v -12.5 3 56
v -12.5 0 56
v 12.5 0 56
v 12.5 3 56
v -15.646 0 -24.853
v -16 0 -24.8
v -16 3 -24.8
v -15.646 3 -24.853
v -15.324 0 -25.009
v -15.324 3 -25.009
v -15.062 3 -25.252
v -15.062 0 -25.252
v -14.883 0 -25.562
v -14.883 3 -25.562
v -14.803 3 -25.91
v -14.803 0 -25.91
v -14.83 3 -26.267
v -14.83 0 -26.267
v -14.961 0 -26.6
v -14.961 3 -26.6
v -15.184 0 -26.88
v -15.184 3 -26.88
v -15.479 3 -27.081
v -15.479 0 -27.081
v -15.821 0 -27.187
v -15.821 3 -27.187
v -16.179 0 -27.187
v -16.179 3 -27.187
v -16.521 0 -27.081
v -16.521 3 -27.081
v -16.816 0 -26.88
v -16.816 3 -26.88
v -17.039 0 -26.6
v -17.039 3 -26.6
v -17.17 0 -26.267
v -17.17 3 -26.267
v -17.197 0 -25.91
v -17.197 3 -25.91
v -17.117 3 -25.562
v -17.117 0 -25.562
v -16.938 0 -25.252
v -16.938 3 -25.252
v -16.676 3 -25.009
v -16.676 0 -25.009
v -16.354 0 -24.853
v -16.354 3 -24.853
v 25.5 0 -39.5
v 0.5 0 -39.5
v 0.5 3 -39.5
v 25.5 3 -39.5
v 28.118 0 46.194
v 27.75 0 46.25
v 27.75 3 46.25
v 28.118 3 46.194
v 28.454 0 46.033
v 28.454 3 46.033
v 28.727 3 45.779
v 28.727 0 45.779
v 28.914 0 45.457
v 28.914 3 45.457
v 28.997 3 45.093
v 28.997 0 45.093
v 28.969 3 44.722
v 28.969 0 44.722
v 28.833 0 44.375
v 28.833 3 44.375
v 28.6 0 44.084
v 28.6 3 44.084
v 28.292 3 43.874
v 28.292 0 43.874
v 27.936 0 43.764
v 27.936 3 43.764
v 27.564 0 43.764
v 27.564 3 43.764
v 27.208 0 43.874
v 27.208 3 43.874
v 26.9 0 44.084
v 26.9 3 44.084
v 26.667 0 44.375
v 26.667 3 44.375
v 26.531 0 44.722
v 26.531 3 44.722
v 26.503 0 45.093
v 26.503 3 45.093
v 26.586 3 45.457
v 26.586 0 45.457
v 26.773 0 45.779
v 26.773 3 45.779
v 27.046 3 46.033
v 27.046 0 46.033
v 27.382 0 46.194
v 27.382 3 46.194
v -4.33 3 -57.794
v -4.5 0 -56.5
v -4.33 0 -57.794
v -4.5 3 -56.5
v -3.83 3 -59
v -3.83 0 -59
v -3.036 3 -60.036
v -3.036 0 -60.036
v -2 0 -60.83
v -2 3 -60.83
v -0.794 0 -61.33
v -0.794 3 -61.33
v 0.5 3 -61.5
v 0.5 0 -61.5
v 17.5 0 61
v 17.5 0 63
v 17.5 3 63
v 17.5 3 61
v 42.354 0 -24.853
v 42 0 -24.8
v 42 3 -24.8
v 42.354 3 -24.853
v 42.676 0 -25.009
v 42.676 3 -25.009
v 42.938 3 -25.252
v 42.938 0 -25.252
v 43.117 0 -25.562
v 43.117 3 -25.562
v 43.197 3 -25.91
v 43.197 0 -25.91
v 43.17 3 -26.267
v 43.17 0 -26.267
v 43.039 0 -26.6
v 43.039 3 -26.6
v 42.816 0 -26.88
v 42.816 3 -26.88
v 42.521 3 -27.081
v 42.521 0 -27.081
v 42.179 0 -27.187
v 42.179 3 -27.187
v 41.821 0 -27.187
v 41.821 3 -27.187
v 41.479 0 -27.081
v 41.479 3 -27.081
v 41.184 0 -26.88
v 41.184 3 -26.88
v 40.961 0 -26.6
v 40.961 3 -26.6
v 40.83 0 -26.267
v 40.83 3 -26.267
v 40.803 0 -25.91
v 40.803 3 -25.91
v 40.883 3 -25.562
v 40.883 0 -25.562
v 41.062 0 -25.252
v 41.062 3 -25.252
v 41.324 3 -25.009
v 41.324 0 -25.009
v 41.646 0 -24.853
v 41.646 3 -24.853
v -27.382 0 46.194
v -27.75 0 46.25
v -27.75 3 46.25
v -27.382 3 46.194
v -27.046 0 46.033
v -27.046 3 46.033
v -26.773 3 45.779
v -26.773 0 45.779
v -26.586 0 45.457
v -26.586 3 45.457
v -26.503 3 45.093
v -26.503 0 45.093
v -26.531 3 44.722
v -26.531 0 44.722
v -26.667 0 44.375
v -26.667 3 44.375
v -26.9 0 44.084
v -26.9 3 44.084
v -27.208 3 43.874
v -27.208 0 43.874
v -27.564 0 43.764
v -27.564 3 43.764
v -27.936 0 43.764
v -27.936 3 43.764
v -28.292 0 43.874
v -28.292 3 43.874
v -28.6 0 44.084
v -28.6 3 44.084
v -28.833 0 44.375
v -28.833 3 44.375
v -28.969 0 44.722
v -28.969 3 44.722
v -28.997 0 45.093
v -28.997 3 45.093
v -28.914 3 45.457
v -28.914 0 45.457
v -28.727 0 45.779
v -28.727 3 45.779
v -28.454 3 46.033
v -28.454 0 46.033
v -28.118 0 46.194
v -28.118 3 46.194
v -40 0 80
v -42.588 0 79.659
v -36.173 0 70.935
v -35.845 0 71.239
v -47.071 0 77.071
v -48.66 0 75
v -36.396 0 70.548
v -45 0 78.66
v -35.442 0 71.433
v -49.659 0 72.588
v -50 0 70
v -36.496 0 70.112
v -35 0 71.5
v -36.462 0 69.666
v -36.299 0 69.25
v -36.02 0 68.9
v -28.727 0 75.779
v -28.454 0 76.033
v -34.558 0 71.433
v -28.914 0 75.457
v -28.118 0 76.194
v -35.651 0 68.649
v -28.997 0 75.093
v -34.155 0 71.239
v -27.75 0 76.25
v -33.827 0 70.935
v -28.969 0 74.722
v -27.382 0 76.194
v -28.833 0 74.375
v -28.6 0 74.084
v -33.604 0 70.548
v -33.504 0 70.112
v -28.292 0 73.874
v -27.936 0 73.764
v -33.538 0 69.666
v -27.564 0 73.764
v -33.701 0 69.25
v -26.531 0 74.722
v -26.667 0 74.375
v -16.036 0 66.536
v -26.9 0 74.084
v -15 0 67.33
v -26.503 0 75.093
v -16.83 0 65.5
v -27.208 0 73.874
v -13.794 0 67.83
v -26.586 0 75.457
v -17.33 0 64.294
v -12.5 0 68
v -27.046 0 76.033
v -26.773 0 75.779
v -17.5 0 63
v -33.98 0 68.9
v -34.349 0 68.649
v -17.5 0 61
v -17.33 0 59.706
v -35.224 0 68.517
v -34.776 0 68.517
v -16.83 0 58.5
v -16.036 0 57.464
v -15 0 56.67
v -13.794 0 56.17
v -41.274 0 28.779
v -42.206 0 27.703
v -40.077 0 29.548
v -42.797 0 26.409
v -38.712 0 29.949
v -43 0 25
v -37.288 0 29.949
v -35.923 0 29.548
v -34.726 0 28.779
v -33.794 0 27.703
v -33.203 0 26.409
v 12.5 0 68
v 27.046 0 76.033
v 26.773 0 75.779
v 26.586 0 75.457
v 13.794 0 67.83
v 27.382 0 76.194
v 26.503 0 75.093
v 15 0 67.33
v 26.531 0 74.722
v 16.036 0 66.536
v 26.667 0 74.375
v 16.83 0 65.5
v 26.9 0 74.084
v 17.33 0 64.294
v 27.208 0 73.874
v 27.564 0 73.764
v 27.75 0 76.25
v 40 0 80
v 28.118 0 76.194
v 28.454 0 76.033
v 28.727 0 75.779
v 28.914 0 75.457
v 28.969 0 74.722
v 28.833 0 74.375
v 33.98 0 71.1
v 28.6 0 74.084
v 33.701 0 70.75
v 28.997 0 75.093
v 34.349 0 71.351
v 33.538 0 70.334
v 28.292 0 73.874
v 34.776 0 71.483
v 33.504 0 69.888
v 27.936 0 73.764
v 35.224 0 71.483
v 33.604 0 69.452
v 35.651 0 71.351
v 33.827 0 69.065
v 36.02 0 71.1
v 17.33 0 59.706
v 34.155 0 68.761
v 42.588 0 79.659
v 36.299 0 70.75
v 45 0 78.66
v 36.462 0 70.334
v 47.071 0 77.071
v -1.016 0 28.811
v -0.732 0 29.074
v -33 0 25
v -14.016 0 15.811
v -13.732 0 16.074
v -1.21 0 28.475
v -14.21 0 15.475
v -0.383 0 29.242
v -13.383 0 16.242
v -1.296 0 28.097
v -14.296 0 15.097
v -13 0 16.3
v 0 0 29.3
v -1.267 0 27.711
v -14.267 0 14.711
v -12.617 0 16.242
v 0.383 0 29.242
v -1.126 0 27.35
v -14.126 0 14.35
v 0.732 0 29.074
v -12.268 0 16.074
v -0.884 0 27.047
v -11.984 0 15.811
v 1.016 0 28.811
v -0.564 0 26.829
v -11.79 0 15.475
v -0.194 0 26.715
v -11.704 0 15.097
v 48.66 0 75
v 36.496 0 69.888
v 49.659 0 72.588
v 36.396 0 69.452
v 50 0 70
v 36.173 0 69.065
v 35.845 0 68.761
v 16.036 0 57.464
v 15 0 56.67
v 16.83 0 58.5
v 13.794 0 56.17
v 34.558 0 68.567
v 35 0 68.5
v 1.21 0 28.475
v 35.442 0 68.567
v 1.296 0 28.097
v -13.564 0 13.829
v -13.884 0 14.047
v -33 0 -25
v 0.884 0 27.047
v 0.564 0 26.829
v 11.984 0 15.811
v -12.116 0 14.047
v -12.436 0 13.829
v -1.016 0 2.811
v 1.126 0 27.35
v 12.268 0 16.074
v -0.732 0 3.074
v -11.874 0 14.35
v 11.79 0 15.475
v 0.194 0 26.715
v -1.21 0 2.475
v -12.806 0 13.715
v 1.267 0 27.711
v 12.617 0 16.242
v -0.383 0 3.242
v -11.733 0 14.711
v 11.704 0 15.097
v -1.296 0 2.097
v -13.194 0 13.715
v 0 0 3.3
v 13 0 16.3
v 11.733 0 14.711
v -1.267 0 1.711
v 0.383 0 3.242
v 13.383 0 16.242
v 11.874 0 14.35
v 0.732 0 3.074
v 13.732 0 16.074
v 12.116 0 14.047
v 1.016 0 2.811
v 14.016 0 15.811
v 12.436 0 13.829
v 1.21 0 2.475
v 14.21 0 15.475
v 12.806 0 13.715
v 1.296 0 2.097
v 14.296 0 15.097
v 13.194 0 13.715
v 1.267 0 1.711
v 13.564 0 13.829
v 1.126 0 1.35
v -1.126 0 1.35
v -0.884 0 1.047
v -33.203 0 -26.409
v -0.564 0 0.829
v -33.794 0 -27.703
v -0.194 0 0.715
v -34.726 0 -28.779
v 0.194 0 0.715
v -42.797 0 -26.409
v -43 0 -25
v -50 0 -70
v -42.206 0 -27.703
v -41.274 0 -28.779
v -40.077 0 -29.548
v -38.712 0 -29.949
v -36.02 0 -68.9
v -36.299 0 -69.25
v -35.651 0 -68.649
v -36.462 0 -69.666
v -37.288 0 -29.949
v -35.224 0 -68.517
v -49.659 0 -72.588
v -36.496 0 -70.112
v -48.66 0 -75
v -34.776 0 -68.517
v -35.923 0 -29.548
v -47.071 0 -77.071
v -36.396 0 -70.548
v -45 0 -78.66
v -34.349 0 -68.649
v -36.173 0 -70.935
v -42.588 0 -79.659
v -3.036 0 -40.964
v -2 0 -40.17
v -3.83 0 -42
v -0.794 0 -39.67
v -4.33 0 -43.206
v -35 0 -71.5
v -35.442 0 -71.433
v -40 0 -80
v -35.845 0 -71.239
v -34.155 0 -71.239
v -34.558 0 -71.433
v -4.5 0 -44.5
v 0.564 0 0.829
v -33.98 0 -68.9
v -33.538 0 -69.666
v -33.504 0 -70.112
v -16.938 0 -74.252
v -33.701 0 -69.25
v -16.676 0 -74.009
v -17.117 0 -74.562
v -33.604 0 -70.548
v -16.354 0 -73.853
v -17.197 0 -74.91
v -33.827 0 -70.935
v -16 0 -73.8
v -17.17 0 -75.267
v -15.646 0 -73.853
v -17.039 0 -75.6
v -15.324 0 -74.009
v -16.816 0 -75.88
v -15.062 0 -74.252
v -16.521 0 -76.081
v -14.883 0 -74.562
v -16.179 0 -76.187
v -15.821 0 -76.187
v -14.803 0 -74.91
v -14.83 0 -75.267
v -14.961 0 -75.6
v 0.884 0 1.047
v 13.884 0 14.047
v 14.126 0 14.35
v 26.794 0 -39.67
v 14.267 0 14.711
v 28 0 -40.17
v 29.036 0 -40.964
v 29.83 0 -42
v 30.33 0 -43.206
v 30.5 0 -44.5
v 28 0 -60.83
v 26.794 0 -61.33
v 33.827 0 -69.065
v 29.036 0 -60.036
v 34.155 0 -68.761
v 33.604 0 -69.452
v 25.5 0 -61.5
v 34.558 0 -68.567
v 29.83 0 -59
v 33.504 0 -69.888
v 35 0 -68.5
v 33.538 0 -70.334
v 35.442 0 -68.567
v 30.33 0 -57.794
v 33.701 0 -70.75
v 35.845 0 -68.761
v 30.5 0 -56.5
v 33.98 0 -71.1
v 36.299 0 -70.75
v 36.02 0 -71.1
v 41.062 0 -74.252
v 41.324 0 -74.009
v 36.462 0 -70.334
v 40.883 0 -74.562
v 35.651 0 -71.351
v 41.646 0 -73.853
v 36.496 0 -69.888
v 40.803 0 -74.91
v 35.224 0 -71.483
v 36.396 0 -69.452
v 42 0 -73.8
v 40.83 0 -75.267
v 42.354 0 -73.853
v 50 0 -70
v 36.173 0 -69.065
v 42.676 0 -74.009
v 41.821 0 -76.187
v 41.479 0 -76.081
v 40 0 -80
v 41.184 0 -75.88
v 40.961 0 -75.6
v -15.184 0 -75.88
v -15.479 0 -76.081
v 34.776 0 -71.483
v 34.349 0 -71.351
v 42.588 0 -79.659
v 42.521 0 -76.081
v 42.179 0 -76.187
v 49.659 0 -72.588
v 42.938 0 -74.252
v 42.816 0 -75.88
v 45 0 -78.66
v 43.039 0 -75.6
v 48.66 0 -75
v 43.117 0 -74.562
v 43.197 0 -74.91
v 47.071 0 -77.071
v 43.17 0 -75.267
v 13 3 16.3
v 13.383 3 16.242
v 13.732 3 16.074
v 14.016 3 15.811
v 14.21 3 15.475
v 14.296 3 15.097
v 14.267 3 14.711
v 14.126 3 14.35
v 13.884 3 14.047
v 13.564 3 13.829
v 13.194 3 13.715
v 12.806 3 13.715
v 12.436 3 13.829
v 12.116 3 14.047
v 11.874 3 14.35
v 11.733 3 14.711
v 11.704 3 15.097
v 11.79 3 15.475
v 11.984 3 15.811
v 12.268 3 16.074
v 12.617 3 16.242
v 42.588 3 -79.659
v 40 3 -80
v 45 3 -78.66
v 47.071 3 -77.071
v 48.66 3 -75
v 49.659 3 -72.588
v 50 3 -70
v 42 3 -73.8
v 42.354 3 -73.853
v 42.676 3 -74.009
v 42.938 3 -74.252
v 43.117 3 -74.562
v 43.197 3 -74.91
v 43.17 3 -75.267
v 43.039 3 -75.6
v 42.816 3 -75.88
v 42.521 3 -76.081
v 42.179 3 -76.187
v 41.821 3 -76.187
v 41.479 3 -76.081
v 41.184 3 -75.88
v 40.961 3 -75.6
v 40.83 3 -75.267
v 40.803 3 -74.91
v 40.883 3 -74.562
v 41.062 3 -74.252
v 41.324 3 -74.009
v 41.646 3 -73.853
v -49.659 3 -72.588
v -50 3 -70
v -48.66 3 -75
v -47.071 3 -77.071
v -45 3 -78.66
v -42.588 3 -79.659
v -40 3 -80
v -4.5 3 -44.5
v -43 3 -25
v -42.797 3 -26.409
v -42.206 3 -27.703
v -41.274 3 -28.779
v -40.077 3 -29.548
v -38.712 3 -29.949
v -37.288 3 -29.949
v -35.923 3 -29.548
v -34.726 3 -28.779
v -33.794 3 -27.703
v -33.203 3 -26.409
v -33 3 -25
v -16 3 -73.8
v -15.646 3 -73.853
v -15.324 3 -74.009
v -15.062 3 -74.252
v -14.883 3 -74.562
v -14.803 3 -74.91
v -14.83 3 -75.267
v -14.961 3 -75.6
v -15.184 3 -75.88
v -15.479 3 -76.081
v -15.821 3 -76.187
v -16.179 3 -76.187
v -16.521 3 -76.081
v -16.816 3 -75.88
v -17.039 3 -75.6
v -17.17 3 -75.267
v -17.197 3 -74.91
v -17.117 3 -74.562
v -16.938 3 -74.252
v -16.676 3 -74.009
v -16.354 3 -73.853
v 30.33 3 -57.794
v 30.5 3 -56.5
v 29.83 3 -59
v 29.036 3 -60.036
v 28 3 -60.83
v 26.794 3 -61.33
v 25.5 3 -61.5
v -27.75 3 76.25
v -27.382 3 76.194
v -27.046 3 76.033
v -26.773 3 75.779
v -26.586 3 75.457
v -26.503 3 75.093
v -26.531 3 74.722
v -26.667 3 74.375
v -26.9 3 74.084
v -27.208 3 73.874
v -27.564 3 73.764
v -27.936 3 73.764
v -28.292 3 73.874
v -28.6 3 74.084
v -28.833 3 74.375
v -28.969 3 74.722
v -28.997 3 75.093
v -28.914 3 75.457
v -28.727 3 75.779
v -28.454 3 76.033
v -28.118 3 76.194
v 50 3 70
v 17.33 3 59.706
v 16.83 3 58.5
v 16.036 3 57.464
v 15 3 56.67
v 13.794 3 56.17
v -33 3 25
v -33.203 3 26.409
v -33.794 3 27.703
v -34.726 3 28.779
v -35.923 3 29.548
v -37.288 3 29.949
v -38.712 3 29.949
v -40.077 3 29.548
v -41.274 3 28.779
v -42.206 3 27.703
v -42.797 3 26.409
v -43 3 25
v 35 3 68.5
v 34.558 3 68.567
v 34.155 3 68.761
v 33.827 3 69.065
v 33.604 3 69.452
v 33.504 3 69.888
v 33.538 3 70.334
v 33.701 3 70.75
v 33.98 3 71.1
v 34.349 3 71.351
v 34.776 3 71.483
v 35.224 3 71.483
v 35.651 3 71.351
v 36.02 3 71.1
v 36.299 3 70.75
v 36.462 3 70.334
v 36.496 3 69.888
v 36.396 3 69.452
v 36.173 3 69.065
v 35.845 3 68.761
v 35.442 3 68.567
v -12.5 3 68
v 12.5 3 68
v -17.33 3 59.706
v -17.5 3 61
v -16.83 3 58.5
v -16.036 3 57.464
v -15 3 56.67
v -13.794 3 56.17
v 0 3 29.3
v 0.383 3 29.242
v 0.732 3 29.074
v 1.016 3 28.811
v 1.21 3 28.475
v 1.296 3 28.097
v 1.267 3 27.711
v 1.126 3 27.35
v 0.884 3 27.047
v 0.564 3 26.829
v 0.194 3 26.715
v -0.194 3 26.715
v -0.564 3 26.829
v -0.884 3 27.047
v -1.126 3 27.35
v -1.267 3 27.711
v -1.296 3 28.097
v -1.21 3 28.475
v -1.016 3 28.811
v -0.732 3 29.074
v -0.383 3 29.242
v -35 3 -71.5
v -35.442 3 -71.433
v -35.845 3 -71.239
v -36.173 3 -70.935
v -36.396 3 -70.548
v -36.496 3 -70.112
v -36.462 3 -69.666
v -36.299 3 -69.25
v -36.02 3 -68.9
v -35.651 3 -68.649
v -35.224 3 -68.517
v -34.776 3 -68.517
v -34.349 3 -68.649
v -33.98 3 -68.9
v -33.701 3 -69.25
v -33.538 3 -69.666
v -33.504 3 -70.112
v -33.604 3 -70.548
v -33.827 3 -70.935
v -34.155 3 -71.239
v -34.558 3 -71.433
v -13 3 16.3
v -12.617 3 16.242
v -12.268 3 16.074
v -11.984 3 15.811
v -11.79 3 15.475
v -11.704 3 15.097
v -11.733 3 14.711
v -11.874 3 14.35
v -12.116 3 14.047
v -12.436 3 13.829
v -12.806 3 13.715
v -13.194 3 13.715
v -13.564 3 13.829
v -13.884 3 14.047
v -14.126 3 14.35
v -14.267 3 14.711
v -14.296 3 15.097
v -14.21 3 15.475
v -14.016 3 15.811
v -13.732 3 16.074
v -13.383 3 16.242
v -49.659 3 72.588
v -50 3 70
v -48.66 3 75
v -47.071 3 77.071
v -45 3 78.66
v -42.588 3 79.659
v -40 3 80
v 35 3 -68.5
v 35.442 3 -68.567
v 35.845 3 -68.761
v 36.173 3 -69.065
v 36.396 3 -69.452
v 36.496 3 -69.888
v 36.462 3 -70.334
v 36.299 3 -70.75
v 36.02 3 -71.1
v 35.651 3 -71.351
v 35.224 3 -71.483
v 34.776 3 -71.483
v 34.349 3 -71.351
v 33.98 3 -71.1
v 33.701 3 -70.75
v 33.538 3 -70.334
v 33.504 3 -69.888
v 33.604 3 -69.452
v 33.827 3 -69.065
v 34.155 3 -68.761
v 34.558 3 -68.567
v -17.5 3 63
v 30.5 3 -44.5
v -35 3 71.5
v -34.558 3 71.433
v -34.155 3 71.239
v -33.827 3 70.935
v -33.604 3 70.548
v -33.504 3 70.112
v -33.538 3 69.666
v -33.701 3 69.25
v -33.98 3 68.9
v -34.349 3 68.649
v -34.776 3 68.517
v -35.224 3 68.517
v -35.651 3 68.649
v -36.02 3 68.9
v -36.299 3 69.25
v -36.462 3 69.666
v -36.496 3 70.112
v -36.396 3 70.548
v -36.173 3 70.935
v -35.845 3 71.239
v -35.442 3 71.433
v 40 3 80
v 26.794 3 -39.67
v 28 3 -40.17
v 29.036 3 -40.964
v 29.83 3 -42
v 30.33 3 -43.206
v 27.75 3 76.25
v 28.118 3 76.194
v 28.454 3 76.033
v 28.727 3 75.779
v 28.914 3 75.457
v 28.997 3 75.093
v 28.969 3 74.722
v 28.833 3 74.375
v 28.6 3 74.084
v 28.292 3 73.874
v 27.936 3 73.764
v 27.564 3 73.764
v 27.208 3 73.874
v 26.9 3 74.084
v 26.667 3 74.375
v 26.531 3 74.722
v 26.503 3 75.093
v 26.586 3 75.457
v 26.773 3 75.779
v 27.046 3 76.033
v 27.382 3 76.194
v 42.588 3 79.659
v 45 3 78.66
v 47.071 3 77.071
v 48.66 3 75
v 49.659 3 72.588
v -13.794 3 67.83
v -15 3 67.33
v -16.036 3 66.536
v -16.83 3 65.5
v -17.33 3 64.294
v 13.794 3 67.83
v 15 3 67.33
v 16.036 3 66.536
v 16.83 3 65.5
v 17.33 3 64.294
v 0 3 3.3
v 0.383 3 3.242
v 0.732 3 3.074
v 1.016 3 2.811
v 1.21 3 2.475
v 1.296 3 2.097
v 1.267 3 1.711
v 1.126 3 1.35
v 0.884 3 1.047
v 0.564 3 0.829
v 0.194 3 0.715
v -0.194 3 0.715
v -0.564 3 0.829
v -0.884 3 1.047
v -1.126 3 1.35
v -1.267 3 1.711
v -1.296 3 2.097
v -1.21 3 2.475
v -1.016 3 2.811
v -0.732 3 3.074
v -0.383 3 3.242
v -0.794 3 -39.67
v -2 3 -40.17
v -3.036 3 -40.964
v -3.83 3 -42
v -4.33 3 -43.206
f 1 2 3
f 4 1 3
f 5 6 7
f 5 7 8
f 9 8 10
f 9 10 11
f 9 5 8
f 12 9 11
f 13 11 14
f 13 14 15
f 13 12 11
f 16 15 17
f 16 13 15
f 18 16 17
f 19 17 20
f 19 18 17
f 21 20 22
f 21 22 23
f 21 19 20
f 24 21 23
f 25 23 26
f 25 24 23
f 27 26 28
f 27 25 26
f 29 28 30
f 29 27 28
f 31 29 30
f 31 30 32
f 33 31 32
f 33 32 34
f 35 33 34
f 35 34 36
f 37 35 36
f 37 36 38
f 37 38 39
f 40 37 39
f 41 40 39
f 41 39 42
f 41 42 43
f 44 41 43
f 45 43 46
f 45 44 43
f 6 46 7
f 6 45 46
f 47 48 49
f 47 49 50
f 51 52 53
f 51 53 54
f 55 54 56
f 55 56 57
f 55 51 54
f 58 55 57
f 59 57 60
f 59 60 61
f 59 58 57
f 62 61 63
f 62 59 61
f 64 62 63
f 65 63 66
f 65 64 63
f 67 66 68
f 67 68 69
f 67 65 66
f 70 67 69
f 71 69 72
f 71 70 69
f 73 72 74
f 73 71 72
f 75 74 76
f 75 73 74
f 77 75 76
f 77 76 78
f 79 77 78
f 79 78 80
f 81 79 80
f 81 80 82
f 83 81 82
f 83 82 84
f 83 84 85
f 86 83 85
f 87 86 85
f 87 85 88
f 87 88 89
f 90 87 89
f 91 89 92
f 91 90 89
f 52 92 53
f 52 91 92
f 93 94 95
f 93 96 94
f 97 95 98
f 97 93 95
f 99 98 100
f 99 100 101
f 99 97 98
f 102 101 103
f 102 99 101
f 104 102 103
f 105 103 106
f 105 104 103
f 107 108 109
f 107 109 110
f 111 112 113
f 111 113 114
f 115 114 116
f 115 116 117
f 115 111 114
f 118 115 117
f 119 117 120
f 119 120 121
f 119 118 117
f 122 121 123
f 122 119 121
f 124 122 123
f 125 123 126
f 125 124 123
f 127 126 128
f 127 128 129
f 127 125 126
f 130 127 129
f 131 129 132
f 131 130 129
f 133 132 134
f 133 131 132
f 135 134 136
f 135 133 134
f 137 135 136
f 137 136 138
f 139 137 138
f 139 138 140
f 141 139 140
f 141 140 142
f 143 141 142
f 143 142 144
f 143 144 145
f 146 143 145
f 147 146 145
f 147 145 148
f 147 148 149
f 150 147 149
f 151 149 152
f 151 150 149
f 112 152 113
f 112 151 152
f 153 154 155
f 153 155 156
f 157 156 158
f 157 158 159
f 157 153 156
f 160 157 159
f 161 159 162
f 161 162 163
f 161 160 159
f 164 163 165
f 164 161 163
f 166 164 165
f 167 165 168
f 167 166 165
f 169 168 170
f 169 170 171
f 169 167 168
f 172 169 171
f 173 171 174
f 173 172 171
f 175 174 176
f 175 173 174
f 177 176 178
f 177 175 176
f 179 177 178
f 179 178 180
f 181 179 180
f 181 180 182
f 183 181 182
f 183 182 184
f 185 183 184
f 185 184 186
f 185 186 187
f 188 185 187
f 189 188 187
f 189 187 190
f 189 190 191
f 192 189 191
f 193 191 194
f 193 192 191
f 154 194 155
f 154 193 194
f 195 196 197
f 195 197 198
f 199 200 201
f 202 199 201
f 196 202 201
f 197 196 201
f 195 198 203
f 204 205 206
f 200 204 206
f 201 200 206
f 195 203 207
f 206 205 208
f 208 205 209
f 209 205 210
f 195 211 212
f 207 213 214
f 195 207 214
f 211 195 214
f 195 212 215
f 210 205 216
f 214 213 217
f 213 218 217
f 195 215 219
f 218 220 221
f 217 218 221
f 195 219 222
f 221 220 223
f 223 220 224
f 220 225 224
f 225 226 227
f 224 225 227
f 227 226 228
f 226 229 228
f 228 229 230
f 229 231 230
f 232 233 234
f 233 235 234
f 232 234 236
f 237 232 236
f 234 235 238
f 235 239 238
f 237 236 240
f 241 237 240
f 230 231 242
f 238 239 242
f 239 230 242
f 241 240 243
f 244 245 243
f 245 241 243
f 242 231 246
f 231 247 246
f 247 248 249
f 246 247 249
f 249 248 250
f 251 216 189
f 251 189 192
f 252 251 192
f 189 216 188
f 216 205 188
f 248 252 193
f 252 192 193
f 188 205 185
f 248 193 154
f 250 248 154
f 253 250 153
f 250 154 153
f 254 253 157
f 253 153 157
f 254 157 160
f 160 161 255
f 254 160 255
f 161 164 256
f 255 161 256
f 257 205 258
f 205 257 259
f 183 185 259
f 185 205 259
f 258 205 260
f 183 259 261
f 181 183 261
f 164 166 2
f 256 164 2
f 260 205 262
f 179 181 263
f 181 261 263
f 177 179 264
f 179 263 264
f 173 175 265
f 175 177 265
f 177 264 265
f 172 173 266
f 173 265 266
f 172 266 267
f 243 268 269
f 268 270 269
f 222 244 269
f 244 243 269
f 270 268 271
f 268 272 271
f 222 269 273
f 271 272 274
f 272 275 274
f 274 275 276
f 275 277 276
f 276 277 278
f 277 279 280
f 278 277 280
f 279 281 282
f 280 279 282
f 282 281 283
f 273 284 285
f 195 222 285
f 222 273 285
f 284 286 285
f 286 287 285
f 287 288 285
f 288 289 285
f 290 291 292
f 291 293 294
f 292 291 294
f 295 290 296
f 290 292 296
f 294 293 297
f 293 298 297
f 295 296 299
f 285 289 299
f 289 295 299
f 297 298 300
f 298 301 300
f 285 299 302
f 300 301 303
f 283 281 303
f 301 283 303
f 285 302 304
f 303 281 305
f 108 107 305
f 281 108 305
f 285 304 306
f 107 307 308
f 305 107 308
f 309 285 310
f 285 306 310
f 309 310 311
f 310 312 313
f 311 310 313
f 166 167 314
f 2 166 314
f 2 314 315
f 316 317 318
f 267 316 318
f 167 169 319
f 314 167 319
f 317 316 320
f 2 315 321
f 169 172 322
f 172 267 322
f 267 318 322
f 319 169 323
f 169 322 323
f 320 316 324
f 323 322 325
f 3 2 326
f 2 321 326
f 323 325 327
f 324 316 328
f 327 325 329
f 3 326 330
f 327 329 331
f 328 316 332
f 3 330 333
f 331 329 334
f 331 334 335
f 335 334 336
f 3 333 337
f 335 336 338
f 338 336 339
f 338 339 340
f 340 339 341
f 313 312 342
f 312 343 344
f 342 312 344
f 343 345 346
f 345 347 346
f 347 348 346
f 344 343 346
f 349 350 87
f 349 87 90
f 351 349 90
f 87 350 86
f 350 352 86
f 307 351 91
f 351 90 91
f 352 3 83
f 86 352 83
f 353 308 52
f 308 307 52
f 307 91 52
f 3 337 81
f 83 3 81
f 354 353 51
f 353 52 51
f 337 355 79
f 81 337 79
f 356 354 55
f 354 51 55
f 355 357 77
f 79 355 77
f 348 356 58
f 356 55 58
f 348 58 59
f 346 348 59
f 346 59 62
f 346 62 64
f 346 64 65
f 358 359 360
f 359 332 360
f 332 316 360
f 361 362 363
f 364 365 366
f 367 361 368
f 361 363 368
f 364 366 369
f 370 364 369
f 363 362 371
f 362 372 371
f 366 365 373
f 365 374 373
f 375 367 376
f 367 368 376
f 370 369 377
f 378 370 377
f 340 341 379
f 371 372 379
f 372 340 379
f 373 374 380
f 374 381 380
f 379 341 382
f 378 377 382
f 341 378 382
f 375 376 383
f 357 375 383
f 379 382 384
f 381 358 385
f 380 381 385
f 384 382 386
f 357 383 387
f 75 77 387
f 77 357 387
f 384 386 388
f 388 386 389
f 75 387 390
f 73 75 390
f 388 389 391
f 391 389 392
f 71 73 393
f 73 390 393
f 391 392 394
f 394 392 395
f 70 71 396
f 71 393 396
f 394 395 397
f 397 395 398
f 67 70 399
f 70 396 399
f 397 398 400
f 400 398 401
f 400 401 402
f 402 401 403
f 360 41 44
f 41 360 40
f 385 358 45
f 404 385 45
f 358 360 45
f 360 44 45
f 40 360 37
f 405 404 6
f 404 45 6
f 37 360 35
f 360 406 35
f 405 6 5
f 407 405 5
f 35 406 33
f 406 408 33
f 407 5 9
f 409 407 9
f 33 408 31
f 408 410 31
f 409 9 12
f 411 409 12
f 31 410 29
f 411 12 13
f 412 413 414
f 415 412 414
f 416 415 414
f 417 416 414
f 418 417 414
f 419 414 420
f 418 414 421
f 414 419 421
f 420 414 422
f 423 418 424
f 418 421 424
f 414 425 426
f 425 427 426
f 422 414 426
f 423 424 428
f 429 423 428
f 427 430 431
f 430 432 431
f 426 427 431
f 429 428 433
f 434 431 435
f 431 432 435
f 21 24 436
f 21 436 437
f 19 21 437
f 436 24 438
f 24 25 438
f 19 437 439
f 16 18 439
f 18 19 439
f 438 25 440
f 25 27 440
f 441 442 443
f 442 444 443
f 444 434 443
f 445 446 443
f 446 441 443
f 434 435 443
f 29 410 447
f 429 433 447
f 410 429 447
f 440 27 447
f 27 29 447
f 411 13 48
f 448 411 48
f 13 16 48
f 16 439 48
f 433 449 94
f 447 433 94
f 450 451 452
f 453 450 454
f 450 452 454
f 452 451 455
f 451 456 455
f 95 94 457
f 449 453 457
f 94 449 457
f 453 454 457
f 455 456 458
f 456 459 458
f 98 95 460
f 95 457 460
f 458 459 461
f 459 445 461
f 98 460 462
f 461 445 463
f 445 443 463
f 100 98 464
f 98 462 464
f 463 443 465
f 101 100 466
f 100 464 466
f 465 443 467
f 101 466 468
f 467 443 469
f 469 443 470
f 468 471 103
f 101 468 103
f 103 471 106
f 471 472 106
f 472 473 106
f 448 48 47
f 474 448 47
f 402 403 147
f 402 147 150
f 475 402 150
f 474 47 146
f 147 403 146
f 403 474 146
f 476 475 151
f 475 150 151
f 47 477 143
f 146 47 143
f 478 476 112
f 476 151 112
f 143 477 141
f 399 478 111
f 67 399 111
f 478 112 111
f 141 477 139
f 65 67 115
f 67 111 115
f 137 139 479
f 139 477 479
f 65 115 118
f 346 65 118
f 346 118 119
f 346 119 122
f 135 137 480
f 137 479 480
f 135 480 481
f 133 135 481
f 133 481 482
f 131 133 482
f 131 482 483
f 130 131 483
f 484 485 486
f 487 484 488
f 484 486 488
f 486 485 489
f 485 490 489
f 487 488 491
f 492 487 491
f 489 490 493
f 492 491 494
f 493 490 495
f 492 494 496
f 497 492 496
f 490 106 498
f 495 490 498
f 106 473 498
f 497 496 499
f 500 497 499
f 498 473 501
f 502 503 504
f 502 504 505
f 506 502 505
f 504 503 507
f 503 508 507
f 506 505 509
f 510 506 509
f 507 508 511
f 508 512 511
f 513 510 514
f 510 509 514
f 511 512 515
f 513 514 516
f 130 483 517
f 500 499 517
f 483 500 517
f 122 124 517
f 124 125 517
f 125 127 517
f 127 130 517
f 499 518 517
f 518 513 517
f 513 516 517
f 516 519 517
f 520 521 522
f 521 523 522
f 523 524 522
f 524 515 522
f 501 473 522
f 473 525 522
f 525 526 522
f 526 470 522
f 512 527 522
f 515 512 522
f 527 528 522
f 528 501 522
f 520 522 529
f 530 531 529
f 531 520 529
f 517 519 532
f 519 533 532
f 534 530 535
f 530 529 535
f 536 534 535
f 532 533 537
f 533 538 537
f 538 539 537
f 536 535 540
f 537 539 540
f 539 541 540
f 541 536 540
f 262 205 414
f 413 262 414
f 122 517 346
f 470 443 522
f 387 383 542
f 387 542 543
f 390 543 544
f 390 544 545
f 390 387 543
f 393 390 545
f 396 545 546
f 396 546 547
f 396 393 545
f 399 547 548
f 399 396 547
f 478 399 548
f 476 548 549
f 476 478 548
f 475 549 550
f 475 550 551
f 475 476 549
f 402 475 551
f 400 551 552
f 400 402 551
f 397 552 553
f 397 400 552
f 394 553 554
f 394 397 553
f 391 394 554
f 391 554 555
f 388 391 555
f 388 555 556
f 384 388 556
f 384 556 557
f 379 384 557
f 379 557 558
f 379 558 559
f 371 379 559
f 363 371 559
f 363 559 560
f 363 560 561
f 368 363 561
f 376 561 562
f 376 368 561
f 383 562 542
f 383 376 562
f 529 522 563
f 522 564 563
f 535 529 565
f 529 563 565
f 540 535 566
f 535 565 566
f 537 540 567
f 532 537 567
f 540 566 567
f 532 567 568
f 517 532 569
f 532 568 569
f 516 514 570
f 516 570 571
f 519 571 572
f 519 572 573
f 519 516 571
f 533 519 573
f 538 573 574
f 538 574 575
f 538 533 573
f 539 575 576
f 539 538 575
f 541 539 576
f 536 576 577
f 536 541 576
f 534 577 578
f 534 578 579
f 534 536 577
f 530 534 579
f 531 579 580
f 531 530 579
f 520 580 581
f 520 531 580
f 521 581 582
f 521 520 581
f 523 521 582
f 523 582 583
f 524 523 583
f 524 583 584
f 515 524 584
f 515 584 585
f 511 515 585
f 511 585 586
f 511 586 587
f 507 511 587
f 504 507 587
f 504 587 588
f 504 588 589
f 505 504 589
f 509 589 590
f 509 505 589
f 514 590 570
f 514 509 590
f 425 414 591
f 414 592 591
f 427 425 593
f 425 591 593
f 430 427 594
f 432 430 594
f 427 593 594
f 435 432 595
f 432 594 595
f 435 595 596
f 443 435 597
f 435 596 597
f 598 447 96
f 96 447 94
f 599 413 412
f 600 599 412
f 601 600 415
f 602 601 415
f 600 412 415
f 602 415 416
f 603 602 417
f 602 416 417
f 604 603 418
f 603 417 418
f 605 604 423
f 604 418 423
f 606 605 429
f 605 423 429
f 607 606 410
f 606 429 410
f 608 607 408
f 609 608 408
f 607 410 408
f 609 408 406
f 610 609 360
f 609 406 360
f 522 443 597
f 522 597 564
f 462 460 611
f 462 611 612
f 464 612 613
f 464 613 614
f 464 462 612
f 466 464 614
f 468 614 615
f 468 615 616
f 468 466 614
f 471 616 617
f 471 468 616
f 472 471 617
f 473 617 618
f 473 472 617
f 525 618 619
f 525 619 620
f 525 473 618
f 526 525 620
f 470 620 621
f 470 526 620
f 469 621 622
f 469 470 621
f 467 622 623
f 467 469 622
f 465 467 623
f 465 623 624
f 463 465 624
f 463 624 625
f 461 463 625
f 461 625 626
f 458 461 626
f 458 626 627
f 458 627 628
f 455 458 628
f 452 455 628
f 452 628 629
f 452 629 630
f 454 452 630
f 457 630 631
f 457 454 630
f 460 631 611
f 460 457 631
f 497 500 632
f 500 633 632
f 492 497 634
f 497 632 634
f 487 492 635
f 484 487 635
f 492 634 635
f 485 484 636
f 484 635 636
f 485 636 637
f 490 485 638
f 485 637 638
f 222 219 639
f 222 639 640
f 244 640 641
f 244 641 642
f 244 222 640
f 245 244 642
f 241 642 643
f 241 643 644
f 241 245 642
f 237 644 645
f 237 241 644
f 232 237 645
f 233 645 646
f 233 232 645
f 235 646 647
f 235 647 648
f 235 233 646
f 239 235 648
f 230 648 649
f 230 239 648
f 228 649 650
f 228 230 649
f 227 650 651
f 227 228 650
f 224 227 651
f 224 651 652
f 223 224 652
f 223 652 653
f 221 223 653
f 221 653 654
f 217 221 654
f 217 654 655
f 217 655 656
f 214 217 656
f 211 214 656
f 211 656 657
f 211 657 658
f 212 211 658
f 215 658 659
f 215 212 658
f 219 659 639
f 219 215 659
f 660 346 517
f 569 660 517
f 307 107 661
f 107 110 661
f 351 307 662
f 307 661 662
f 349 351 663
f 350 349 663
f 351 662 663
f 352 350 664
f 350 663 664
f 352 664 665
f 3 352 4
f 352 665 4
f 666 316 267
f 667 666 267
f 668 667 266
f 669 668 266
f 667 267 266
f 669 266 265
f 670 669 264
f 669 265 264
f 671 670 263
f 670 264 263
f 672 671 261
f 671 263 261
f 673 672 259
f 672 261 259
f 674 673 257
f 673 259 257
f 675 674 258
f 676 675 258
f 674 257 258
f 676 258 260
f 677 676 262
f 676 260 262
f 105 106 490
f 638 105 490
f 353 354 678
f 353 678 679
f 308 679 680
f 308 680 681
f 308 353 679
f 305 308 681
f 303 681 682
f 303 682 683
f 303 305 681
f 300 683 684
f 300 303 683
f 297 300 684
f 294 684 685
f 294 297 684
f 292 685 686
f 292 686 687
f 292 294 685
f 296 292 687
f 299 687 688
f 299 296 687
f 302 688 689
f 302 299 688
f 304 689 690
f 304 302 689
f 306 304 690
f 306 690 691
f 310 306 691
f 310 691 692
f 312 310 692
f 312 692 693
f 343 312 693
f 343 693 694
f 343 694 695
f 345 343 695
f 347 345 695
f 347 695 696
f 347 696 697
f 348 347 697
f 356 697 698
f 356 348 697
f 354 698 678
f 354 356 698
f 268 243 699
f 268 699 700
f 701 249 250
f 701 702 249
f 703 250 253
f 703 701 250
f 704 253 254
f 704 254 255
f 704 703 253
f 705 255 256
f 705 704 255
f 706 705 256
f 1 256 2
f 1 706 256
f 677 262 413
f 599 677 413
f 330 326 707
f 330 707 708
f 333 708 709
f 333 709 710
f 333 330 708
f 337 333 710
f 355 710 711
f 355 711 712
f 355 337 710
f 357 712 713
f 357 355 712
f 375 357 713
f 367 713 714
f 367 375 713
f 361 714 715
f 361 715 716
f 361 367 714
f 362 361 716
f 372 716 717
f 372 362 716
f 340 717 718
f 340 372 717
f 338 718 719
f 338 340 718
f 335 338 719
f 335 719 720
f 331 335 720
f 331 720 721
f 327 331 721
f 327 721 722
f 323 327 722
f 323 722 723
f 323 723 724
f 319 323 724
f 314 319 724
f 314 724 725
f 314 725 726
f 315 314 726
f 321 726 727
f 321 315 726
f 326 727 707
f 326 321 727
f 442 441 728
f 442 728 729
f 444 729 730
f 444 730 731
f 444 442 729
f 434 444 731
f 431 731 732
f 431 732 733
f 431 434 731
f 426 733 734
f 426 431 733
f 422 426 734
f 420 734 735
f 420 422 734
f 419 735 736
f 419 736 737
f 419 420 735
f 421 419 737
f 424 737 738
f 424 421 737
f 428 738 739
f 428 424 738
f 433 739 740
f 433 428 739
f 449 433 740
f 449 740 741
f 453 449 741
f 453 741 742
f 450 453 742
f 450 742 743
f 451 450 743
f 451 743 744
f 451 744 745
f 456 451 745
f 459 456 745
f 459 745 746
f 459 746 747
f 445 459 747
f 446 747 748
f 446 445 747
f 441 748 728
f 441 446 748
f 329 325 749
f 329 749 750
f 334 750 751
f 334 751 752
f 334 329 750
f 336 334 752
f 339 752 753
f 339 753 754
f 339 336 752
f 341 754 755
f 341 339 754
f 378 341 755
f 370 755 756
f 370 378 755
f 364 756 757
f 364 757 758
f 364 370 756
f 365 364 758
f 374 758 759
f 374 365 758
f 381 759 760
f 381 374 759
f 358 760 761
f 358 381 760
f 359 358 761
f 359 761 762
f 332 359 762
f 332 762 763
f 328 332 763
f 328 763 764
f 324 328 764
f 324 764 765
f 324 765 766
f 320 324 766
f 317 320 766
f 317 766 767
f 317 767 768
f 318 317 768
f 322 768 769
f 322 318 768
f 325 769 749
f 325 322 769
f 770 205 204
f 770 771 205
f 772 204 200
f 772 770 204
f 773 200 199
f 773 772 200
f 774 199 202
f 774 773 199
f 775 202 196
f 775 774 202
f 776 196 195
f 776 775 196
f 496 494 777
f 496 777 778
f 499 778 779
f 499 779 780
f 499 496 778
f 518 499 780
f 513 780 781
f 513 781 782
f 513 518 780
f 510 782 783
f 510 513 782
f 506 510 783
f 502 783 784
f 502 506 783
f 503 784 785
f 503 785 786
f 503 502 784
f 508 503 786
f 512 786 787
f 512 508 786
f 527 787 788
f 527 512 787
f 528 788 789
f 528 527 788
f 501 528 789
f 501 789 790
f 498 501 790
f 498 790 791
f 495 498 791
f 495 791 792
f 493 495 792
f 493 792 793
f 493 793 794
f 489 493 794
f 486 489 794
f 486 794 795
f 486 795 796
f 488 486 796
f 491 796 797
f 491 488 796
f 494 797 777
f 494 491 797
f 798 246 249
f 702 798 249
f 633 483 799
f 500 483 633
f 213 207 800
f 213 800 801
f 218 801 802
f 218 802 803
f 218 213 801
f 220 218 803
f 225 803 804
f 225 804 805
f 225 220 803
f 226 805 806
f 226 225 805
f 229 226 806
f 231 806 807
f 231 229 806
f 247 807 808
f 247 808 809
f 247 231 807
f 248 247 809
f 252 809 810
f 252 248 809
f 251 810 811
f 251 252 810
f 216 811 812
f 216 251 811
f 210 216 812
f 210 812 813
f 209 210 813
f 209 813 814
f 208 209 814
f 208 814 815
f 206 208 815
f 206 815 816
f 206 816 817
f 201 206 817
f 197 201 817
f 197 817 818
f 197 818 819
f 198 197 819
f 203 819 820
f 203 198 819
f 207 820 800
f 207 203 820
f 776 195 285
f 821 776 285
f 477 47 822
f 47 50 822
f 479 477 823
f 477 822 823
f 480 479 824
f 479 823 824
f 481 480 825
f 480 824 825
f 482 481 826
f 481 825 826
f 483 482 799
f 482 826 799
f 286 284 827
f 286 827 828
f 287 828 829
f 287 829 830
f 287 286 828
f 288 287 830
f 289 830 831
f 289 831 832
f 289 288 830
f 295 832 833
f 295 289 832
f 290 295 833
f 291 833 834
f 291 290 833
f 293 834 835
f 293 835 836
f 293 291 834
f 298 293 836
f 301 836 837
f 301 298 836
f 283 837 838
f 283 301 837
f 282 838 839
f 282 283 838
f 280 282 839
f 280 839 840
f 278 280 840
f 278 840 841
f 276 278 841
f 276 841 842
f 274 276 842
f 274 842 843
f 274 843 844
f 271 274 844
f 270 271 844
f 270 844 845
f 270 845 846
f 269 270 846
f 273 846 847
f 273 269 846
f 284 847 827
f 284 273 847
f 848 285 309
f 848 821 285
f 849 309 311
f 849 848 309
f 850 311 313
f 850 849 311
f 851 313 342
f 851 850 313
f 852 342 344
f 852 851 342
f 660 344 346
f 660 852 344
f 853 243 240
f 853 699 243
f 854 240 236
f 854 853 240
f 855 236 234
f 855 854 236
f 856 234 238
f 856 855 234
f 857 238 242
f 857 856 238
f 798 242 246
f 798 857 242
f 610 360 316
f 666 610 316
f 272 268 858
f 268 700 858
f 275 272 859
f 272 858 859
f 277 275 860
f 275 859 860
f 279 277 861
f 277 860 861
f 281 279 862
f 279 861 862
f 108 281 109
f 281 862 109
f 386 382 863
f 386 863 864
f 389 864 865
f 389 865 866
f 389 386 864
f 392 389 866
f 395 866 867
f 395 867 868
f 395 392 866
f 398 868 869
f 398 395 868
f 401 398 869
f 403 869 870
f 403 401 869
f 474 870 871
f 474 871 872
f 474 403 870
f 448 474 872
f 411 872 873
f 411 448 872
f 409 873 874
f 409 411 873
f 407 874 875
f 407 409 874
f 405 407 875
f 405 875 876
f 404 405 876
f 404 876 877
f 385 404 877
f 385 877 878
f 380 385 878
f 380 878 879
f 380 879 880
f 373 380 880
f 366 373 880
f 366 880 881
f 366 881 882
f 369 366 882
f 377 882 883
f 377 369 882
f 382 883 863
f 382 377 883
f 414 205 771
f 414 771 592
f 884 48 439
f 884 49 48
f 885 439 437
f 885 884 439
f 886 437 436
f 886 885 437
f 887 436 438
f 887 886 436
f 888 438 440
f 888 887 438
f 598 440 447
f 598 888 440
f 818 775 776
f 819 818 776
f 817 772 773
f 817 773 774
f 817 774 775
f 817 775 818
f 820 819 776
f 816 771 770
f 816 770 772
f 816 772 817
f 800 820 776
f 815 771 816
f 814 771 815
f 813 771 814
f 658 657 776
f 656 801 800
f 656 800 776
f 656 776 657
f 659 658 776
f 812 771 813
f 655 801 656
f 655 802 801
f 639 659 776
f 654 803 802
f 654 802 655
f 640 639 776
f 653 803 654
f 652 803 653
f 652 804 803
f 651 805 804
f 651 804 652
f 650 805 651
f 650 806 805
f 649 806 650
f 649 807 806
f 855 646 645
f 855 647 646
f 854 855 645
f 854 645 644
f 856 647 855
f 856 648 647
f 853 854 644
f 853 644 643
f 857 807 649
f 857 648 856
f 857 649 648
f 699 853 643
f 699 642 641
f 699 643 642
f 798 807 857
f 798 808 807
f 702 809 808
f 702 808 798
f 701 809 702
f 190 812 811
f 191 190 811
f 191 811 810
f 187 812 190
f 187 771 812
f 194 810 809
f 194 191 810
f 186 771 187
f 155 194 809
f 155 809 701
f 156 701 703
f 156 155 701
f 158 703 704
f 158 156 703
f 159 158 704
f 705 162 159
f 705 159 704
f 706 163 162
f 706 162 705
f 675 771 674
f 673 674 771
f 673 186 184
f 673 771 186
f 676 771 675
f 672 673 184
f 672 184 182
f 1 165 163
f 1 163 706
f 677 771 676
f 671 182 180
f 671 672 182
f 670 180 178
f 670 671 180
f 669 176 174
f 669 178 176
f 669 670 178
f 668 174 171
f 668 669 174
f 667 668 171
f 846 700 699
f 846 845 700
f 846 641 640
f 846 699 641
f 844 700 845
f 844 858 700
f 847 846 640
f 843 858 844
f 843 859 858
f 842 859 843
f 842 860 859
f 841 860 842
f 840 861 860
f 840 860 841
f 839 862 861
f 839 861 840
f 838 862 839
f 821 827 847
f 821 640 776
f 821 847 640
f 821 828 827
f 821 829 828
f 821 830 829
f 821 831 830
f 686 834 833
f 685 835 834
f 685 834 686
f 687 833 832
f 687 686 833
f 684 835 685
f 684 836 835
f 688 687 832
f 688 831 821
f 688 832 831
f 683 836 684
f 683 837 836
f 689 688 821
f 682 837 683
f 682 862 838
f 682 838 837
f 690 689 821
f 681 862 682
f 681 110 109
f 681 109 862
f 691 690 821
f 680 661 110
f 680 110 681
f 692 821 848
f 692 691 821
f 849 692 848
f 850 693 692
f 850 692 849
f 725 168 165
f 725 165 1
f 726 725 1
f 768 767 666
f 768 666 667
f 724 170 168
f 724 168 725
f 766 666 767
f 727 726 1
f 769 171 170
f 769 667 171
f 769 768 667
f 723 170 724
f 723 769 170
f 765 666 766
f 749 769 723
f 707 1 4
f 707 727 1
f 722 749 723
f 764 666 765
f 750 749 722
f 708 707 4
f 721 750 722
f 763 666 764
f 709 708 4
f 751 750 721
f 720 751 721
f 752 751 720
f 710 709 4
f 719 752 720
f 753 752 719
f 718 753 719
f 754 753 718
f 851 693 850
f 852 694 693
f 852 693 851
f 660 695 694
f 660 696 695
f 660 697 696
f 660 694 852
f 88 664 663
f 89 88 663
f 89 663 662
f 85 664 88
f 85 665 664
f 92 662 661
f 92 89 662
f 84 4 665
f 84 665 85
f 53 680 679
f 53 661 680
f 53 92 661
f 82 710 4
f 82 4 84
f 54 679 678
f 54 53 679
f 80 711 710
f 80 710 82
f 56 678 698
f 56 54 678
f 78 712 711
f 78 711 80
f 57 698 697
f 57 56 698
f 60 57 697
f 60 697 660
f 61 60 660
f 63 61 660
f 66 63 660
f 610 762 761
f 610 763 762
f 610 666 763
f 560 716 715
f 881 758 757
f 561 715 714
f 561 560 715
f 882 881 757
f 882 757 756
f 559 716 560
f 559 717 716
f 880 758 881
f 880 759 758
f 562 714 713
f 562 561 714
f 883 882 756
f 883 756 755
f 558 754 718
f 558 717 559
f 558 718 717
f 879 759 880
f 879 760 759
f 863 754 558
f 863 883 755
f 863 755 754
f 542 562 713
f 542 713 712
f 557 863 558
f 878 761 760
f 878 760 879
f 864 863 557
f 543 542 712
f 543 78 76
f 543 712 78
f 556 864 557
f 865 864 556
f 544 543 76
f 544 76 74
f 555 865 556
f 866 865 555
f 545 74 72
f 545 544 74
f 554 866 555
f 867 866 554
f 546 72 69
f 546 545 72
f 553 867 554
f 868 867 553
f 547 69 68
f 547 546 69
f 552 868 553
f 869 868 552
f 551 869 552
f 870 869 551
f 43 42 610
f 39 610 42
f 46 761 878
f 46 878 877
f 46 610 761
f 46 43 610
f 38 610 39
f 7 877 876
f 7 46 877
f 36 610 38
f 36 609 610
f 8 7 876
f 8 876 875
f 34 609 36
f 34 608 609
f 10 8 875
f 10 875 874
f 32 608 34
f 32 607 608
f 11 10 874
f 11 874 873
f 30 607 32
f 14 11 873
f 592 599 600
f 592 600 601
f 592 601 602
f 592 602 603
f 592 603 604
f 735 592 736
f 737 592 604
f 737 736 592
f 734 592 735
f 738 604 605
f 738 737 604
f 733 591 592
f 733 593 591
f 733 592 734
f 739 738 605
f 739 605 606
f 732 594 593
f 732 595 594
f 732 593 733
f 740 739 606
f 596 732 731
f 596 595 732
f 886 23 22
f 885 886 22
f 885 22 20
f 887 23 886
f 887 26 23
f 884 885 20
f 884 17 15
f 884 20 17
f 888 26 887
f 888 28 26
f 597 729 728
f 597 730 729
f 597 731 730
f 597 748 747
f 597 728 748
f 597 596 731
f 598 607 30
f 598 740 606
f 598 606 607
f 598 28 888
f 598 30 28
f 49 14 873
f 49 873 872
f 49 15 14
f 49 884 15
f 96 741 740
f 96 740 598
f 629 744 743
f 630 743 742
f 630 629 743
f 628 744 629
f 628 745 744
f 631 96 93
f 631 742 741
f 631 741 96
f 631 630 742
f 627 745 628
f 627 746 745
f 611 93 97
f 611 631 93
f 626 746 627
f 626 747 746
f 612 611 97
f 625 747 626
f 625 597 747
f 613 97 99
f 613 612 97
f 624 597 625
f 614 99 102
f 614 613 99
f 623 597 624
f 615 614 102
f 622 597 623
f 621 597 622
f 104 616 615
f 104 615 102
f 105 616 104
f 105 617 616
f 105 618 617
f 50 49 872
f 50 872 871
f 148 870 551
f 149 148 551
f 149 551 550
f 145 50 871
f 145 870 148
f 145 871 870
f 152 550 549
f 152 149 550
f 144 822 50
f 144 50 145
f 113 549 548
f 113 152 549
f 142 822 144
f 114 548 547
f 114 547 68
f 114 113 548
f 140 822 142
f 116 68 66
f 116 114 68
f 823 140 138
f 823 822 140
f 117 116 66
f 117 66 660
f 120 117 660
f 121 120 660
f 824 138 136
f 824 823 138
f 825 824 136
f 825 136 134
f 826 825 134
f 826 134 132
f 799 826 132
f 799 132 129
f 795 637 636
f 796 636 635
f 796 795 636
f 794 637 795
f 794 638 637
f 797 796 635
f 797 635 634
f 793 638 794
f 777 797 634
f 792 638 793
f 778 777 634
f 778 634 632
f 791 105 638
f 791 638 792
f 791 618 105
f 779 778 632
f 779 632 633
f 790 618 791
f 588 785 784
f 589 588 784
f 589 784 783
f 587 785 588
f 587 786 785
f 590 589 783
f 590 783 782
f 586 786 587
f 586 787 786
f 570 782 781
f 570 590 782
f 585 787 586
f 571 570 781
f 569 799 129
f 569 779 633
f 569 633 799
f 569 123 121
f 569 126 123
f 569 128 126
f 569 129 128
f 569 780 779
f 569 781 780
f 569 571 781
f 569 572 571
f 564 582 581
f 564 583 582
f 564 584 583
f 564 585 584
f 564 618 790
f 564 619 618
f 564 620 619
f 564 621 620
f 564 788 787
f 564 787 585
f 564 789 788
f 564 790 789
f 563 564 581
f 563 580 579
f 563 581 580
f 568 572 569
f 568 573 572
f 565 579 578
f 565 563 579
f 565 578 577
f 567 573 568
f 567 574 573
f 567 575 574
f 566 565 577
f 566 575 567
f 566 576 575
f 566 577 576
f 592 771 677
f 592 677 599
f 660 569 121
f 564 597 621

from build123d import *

# Parameters (mm, degrees)
SKETCH_1_W      = 100
SKETCH_1_H      = 160
SKETCH_1_R      = 1.5
SKETCH_1_R_2    = 1.3
SKETCH_1_R_3    = 1.2
SKETCH_1_R_4    = 1.25
SKETCH_1_W_2    = 35
SKETCH_1_H_2    = 12
SKETCH_1_H_3    = 22
EXTRUDE_1_DEPTH = 3
FILLET_1_R      = 10
FILLET_2_R      = 5


with BuildPart() as part:
    # 草图1 → 凸台-拉伸1 (new body)
    with BuildSketch(Plane(origin=(0, 0, 0), x_dir=(1, 0, 0), z_dir=(0, 1, 0))):
        Rectangle(SKETCH_1_W, SKETCH_1_H)
        with Locations(Location((35, 70, 0), (0, 0, 270))):
            Circle(SKETCH_1_R, mode=Mode.SUBTRACT)
        with Locations(Location((-35, 70, 0), (0, 0, 90))):
            Circle(SKETCH_1_R, mode=Mode.SUBTRACT)
        with Locations(Location((-35, -70, 0), (0, 0, 270))):
            Circle(SKETCH_1_R, mode=Mode.SUBTRACT)
        with Locations(Location((35, -70, 0), (0, 0, 90))):
            Circle(SKETCH_1_R, mode=Mode.SUBTRACT)
        with Locations(Location((0, -2, 0), (0, 0, 270))):
            Circle(SKETCH_1_R_2, mode=Mode.SUBTRACT)
        with Locations(Location((13, -15, 0), (0, 0, 270))):
            Circle(SKETCH_1_R_2, mode=Mode.SUBTRACT)
        with Locations(Location((0, -28, 0), (0, 0, 270))):
            Circle(SKETCH_1_R_2, mode=Mode.SUBTRACT)
        with Locations(Location((-13, -15, 0), (0, 0, 270))):
            Circle(SKETCH_1_R_2, mode=Mode.SUBTRACT)
        with Locations(Location((-16, 26, 0), (0, 0, 270))):
            Circle(SKETCH_1_R_3, mode=Mode.SUBTRACT)
        with Locations(Location((42, 26, 0), (0, 0, 270))):
            Circle(SKETCH_1_R_3, mode=Mode.SUBTRACT)
        with Locations(Location((42, 75, 0), (0, 0, 270))):
            Circle(SKETCH_1_R_3, mode=Mode.SUBTRACT)
        with Locations(Location((-16, 75, 0), (0, 0, 270))):
            Circle(SKETCH_1_R_3, mode=Mode.SUBTRACT)
        with Locations(Location((-27.75, -75, 0), (0, 0, 270))):
            Circle(SKETCH_1_R_4, mode=Mode.SUBTRACT)
        with Locations(Location((27.75, -75, 0), (0, 0, 270))):
            Circle(SKETCH_1_R_4, mode=Mode.SUBTRACT)
        with Locations(Location((27.75, -45, 0), (0, 0, 270))):
            Circle(SKETCH_1_R_4, mode=Mode.SUBTRACT)
        with Locations(Location((-27.75, -45, 0), (0, 0, 270))):
            Circle(SKETCH_1_R_4, mode=Mode.SUBTRACT)
        with Locations((0, -62)):
            Rectangle(SKETCH_1_W_2, SKETCH_1_H_2, mode=Mode.SUBTRACT)
        with Locations((13, 50.5)):
            Rectangle(SKETCH_1_W_2, SKETCH_1_H_3, mode=Mode.SUBTRACT)
        with BuildLine():
            Line((-43, -25), (-43, 25))
            ThreePointArc((-43, 25), (-38, 30), (-33, 25))
            Line((-33, 25), (-33, -25))
            ThreePointArc((-33, -25), (-38, -30), (-43, -25))
        make_face(mode=Mode.SUBTRACT)
    extrude(amount=EXTRUDE_1_DEPTH)

    # 圆角1
    fillet_1_edges = [part.edges().sort_by_distance(p)[0] for p in [
        (50, 1.5, 80),
        (-50, 1.5, 80),
        (-50, 1.5, -80),
        (50, 1.5, -80),
    ]]
    fillet(fillet_1_edges, radius=FILLET_1_R)

    # 圆角2
    fillet_2_edges = [part.edges().sort_by_distance(p)[0] for p in [
        (17.5, 1.5, 68),
        (17.5, 1.5, 56),
        (-17.5, 1.5, 56),
        (-17.5, 1.5, 68),
        (30.5, 1.5, -39.5),
        (30.5, 1.5, -61.5),
        (-4.5, 1.5, -61.5),
        (-4.5, 1.5, -39.5),
    ]]
    fillet(fillet_2_edges, radius=FILLET_2_R)


solid = part.part
